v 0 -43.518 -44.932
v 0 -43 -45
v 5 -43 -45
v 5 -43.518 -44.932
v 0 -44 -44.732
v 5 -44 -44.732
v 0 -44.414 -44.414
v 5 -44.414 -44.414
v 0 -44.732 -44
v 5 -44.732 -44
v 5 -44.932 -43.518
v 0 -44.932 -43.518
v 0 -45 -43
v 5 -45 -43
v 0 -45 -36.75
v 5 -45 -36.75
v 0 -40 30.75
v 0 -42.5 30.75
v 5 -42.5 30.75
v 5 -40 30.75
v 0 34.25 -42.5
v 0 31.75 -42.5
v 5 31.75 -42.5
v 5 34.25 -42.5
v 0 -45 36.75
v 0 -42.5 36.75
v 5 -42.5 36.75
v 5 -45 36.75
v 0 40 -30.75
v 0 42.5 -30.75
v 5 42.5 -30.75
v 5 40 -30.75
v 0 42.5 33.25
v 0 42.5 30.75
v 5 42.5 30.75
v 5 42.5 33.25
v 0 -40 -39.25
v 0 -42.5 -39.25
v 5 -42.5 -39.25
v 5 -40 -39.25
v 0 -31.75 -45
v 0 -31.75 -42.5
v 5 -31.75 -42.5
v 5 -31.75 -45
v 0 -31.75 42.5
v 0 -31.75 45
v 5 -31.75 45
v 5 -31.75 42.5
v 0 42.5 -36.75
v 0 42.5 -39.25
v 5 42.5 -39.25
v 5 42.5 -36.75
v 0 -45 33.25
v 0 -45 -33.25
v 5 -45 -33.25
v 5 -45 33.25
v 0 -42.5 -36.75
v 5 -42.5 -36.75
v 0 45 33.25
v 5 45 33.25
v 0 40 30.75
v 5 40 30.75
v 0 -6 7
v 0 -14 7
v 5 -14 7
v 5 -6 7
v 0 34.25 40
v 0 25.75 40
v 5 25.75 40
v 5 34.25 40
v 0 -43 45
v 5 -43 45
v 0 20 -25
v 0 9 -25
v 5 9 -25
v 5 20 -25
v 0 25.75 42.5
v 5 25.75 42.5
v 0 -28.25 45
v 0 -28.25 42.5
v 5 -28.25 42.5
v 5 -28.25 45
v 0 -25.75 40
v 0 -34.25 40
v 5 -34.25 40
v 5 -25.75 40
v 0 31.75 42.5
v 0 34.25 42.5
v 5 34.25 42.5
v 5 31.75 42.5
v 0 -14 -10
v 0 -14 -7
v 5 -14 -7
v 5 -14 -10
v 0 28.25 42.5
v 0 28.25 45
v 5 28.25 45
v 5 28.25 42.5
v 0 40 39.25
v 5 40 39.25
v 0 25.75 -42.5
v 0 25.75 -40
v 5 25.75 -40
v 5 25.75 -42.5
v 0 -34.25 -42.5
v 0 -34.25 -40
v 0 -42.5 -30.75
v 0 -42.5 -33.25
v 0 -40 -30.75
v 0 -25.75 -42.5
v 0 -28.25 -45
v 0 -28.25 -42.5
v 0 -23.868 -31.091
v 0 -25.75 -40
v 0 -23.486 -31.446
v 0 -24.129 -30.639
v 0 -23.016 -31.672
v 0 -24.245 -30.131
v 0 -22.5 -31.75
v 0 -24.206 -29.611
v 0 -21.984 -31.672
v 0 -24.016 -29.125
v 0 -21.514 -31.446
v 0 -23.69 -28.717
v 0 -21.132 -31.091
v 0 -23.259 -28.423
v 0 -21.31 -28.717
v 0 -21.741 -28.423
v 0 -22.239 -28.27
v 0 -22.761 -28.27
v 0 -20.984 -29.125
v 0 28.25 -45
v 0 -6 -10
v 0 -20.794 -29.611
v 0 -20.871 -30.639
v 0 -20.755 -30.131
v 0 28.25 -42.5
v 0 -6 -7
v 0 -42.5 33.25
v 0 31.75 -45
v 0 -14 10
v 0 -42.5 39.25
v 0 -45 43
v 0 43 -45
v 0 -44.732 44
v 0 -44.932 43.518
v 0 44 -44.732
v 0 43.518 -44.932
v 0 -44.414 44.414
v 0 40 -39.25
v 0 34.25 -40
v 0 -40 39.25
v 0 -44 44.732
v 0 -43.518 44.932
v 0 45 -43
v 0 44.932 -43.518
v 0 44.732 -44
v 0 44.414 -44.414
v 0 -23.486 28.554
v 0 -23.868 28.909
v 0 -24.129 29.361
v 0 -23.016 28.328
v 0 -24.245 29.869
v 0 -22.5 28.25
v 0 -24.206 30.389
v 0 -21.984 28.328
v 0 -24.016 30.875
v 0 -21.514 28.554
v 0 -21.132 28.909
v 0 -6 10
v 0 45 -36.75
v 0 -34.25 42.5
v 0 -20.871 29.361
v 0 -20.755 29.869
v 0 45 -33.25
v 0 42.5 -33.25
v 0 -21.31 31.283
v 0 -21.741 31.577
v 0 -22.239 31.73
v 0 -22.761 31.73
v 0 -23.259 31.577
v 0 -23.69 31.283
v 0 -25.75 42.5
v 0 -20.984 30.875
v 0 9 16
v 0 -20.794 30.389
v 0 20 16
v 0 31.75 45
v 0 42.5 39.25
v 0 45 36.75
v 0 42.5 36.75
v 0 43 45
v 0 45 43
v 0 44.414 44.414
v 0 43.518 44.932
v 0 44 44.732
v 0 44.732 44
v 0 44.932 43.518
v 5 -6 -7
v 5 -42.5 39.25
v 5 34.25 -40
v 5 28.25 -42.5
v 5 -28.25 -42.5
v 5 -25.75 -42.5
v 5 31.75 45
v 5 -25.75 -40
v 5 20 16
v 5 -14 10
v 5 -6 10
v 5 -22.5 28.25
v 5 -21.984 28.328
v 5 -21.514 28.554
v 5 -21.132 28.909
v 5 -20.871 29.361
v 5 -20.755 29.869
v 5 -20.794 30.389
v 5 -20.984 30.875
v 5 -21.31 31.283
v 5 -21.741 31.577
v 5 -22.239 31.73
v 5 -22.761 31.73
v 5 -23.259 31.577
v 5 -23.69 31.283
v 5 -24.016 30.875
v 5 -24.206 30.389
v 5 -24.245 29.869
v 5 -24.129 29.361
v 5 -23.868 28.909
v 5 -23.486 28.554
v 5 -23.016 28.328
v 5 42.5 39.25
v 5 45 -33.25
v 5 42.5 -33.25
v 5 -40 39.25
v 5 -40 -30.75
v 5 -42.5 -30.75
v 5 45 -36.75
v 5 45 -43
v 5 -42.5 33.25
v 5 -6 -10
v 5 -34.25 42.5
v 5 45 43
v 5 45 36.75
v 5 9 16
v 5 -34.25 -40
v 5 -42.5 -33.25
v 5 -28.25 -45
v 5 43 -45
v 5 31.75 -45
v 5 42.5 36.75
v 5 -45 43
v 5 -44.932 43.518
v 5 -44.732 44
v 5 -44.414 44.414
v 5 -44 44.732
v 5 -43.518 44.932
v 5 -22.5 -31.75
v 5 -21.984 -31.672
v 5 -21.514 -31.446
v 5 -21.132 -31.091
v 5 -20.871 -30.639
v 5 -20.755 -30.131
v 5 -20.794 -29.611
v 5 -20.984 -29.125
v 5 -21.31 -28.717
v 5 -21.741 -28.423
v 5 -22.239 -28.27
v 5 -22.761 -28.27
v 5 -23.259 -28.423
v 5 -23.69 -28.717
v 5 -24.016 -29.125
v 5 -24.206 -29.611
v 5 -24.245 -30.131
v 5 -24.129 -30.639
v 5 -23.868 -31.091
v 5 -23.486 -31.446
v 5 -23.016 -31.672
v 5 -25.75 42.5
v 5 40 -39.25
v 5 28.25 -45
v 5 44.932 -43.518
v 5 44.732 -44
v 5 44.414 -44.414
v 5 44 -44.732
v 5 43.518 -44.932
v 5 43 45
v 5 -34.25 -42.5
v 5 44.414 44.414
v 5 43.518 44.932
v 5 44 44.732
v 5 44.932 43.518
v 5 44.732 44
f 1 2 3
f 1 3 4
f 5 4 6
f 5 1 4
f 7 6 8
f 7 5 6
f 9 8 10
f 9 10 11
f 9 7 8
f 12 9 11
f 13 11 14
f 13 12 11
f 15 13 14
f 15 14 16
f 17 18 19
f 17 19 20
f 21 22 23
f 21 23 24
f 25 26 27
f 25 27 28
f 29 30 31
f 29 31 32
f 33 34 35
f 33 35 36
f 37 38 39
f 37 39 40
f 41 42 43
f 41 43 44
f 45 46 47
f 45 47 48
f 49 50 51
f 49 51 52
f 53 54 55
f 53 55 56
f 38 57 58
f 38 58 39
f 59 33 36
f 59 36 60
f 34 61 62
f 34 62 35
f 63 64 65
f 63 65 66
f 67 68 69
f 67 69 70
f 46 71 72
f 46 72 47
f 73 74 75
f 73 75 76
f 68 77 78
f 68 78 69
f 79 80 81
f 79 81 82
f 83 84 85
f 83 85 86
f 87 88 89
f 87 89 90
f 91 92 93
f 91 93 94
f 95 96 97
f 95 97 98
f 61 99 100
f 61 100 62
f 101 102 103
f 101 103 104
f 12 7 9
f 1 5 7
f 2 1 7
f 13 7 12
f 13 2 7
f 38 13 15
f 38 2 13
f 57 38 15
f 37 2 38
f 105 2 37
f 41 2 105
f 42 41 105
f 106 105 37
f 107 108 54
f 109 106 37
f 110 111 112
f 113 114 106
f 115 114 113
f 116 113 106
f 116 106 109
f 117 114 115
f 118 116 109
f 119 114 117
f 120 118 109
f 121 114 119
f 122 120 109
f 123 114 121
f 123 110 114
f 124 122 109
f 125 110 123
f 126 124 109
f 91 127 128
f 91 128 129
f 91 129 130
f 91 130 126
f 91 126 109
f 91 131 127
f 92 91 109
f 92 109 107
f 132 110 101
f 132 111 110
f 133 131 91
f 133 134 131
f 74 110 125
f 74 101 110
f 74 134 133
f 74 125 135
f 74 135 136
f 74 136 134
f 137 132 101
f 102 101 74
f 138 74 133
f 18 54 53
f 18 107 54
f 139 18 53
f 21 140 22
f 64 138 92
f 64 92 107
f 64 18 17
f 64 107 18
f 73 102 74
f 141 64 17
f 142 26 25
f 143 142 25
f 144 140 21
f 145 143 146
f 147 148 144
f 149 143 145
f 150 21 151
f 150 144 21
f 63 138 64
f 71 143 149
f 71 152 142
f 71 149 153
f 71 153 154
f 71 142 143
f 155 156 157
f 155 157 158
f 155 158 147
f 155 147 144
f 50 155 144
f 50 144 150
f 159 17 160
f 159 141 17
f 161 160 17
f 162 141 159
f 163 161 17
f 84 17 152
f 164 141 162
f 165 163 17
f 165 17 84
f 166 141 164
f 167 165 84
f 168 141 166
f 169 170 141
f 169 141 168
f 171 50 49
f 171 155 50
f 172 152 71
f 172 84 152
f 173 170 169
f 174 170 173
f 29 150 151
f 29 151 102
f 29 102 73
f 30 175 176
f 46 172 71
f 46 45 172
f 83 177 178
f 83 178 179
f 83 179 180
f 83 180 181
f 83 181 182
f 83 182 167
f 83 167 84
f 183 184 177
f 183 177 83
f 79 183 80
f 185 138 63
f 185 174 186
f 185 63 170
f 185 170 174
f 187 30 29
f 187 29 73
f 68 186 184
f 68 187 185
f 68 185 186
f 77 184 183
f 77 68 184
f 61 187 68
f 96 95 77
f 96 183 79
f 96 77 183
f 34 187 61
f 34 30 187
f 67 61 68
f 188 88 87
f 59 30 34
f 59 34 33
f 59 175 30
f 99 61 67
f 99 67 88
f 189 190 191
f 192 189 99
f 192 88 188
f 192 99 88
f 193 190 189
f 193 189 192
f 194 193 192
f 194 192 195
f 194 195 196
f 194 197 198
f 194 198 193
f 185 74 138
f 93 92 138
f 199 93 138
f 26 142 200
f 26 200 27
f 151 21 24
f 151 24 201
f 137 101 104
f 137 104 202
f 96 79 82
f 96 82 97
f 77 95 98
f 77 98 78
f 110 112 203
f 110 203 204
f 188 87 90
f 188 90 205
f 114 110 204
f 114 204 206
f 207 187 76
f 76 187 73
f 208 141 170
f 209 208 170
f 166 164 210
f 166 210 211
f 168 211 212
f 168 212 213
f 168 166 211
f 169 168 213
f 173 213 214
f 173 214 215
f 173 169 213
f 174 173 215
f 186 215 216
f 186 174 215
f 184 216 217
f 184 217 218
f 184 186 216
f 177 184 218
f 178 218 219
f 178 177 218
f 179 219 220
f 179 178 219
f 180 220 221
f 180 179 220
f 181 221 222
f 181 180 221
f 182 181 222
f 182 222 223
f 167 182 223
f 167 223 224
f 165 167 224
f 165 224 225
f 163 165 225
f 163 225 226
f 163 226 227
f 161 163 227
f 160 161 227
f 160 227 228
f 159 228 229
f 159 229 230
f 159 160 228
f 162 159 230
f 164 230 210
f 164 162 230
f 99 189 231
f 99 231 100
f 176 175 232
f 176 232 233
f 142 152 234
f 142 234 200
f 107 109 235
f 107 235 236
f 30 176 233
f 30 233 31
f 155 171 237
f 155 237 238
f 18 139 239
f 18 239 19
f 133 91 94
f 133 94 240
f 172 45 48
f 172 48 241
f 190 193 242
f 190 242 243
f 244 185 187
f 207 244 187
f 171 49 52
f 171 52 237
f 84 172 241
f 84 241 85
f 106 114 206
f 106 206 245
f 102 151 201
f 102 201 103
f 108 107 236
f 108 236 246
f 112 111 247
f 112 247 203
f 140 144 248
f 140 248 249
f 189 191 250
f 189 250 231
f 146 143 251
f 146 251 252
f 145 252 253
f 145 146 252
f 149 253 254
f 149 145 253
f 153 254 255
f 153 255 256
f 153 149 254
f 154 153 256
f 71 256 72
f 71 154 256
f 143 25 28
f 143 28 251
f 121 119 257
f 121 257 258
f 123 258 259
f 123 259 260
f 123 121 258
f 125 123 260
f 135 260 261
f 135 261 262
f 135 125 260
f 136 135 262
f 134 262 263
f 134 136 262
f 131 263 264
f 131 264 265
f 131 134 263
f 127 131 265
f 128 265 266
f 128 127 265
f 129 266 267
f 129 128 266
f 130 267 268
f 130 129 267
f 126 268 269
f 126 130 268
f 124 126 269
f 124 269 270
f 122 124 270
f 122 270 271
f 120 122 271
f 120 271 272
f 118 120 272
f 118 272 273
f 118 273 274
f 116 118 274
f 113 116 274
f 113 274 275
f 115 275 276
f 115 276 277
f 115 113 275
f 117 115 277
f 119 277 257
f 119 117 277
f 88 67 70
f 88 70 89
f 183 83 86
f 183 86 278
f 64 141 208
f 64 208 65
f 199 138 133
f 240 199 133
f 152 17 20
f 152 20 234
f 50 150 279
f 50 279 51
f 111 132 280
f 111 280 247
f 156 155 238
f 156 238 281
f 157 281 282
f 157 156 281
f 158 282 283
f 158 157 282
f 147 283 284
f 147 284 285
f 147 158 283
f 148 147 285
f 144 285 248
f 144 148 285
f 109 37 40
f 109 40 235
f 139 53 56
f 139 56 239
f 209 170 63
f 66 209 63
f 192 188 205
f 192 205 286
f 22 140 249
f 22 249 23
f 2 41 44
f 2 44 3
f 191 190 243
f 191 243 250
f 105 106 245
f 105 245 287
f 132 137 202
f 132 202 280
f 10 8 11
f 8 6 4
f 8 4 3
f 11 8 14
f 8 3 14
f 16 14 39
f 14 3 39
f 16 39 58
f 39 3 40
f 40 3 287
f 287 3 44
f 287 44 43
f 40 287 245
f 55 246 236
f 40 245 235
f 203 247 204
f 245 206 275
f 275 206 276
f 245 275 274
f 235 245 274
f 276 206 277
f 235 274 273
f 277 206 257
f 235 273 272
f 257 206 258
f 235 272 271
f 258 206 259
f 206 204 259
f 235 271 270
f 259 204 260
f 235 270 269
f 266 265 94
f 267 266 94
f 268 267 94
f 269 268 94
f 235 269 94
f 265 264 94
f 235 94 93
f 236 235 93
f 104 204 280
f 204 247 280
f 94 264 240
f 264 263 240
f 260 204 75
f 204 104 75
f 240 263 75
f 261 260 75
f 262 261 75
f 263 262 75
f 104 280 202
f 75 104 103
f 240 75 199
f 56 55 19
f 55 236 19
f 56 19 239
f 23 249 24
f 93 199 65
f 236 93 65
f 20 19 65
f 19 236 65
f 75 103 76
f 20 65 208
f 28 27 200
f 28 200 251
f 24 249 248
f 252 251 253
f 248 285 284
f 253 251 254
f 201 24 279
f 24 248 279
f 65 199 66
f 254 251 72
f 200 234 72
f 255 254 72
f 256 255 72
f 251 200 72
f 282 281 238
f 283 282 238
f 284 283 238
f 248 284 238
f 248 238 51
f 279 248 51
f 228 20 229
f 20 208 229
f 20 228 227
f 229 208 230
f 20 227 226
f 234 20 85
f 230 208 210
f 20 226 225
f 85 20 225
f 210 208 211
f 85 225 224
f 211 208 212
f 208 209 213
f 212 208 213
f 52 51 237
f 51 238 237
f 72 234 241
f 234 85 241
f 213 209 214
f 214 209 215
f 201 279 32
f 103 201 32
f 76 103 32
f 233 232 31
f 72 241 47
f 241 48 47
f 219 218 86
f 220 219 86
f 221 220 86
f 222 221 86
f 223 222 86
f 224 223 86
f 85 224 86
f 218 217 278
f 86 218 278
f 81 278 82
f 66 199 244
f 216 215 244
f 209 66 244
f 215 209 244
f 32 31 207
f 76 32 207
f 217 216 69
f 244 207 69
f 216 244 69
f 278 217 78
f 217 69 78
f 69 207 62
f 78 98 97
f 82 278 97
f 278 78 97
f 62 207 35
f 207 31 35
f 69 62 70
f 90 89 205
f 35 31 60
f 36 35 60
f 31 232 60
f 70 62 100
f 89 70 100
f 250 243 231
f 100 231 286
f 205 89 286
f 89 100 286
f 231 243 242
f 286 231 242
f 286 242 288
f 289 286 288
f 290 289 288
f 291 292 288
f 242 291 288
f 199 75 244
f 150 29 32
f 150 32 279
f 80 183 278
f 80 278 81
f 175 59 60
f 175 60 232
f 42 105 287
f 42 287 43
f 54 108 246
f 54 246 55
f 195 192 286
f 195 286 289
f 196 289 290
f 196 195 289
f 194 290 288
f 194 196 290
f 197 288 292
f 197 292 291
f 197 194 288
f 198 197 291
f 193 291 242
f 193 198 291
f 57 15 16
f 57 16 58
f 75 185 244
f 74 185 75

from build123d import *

# Parameters (mm, degrees)
SKETCH_1_R      = 1.75
SKETCH_1_W      = 3
SKETCH_1_H      = 8
SKETCH_1_W_2    = 41
SKETCH_1_H_2    = 11
EXTRUDE_1_DEPTH = 5


with BuildPart() as part:
    # Эскиз1 → Бобышка-Вытянуть1 (new body)
    with BuildSketch(Plane(origin=(0, 0, 0), x_dir=(0, 0, -1), z_dir=(1, 0, 0))):
        with BuildLine():
            Line((-36.75, 45), (-36.75, 42.5))
            Line((-36.75, 42.5), (-39.25, 42.5))
            Line((-39.25, 42.5), (-39.25, 40))
            Line((-39.25, 40), (-30.75, 40))
            Line((-30.75, 40), (-30.75, 42.5))
            Line((-30.75, 42.5), (-33.25, 42.5))
            Line((-33.25, 42.5), (-33.25, 45))
            Line((-33.25, 45), (33.25, 45))
            Line((33.25, 45), (33.25, 42.5))
            Line((33.25, 42.5), (30.75, 42.5))
            Line((30.75, 42.5), (30.75, 40))
            Line((30.75, 40), (39.25, 40))
            Line((39.25, 40), (39.25, 42.5))
            Line((39.25, 42.5), (36.75, 42.5))
            Line((36.75, 42.5), (36.75, 45))
            Line((36.75, 45), (43, 45))
            ThreePointArc((43, 45), (44.414213562, 44.414213562), (45, 43))
            Line((45, 43), (45, 31.75))
            Line((45, 31.75), (42.5, 31.75))
            Line((42.5, 31.75), (42.5, 34.25))
            Line((42.5, 34.25), (40, 34.25))
            Line((40, 34.25), (40, 25.75))
            Line((40, 25.75), (42.5, 25.75))
            Line((42.5, 25.75), (42.5, 28.25))
            Line((42.5, 28.25), (45, 28.25))
            Line((45, 28.25), (45, -28.25))
            Line((45, -28.25), (42.5, -28.25))
            Line((42.5, -28.25), (42.5, -25.75))
            Line((42.5, -25.75), (40, -25.75))
            Line((40, -25.75), (40, -34.25))
            Line((40, -34.25), (42.5, -34.25))
            Line((42.5, -34.25), (42.5, -31.75))
            Line((42.5, -31.75), (45, -31.75))
            Line((45, -31.75), (45, -43))
            ThreePointArc((45, -43), (44.414213562, -44.414213562), (43, -45))
            Line((43, -45), (36.75, -45))
            Line((36.75, -45), (36.75, -42.5))
            Line((36.75, -42.5), (39.25, -42.5))
            Line((39.25, -42.5), (39.25, -40))
            Line((39.25, -40), (30.75, -40))
            Line((30.75, -40), (30.75, -42.5))
            Line((30.75, -42.5), (33.25, -42.5))
            Line((33.25, -42.5), (33.25, -45))
            Line((33.25, -45), (-33.25, -45))
            Line((-33.25, -45), (-33.25, -42.5))
            Line((-33.25, -42.5), (-30.75, -42.5))
            Line((-30.75, -42.5), (-30.75, -40))
            Line((-30.75, -40), (-39.25, -40))
            Line((-39.25, -40), (-39.25, -42.5))
            Line((-39.25, -42.5), (-36.75, -42.5))
            Line((-36.75, -42.5), (-36.75, -45))
            Line((-36.75, -45), (-43, -45))
            ThreePointArc((-43, -45), (-44.414213562, -44.414213562), (-45, -43))
            Line((-45, -43), (-45, -31.75))
            Line((-45, -31.75), (-42.5, -31.75))
            Line((-42.5, -31.75), (-42.5, -34.25))
            Line((-42.5, -34.25), (-40, -34.25))
            Line((-40, -34.25), (-40, -25.75))
            Line((-40, -25.75), (-42.5, -25.75))
            Line((-42.5, -25.75), (-42.5, -28.25))
            Line((-42.5, -28.25), (-45, -28.25))
            Line((-45, -28.25), (-45, 28.25))
            Line((-45, 28.25), (-42.5, 28.25))
            Line((-42.5, 28.25), (-42.5, 25.75))
            Line((-42.5, 25.75), (-40, 25.75))
            Line((-40, 25.75), (-40, 34.25))
            Line((-40, 34.25), (-42.5, 34.25))
            Line((-42.5, 34.25), (-42.5, 31.75))
            Line((-42.5, 31.75), (-45, 31.75))
            Line((-45, 31.75), (-45, 43))
            ThreePointArc((-45, 43), (-44.414213562, 44.414213562), (-43, 45))
            Line((-43, 45), (-36.75, 45))
        make_face()
        with Locations((-30, -22.5)):
            Circle(SKETCH_1_R, mode=Mode.SUBTRACT)
        with Locations((30, -22.5)):
            Circle(SKETCH_1_R, mode=Mode.SUBTRACT)
        with Locations((8.5, -10)):
            Rectangle(SKETCH_1_W, SKETCH_1_H, mode=Mode.SUBTRACT)
        with Locations((-8.5, -10)):
            Rectangle(SKETCH_1_W, SKETCH_1_H, mode=Mode.SUBTRACT)
        with Locations((4.5, 14.5)):
            Rectangle(SKETCH_1_W_2, SKETCH_1_H_2, mode=Mode.SUBTRACT)
    extrude(amount=EXTRUDE_1_DEPTH)


solid = part.part
